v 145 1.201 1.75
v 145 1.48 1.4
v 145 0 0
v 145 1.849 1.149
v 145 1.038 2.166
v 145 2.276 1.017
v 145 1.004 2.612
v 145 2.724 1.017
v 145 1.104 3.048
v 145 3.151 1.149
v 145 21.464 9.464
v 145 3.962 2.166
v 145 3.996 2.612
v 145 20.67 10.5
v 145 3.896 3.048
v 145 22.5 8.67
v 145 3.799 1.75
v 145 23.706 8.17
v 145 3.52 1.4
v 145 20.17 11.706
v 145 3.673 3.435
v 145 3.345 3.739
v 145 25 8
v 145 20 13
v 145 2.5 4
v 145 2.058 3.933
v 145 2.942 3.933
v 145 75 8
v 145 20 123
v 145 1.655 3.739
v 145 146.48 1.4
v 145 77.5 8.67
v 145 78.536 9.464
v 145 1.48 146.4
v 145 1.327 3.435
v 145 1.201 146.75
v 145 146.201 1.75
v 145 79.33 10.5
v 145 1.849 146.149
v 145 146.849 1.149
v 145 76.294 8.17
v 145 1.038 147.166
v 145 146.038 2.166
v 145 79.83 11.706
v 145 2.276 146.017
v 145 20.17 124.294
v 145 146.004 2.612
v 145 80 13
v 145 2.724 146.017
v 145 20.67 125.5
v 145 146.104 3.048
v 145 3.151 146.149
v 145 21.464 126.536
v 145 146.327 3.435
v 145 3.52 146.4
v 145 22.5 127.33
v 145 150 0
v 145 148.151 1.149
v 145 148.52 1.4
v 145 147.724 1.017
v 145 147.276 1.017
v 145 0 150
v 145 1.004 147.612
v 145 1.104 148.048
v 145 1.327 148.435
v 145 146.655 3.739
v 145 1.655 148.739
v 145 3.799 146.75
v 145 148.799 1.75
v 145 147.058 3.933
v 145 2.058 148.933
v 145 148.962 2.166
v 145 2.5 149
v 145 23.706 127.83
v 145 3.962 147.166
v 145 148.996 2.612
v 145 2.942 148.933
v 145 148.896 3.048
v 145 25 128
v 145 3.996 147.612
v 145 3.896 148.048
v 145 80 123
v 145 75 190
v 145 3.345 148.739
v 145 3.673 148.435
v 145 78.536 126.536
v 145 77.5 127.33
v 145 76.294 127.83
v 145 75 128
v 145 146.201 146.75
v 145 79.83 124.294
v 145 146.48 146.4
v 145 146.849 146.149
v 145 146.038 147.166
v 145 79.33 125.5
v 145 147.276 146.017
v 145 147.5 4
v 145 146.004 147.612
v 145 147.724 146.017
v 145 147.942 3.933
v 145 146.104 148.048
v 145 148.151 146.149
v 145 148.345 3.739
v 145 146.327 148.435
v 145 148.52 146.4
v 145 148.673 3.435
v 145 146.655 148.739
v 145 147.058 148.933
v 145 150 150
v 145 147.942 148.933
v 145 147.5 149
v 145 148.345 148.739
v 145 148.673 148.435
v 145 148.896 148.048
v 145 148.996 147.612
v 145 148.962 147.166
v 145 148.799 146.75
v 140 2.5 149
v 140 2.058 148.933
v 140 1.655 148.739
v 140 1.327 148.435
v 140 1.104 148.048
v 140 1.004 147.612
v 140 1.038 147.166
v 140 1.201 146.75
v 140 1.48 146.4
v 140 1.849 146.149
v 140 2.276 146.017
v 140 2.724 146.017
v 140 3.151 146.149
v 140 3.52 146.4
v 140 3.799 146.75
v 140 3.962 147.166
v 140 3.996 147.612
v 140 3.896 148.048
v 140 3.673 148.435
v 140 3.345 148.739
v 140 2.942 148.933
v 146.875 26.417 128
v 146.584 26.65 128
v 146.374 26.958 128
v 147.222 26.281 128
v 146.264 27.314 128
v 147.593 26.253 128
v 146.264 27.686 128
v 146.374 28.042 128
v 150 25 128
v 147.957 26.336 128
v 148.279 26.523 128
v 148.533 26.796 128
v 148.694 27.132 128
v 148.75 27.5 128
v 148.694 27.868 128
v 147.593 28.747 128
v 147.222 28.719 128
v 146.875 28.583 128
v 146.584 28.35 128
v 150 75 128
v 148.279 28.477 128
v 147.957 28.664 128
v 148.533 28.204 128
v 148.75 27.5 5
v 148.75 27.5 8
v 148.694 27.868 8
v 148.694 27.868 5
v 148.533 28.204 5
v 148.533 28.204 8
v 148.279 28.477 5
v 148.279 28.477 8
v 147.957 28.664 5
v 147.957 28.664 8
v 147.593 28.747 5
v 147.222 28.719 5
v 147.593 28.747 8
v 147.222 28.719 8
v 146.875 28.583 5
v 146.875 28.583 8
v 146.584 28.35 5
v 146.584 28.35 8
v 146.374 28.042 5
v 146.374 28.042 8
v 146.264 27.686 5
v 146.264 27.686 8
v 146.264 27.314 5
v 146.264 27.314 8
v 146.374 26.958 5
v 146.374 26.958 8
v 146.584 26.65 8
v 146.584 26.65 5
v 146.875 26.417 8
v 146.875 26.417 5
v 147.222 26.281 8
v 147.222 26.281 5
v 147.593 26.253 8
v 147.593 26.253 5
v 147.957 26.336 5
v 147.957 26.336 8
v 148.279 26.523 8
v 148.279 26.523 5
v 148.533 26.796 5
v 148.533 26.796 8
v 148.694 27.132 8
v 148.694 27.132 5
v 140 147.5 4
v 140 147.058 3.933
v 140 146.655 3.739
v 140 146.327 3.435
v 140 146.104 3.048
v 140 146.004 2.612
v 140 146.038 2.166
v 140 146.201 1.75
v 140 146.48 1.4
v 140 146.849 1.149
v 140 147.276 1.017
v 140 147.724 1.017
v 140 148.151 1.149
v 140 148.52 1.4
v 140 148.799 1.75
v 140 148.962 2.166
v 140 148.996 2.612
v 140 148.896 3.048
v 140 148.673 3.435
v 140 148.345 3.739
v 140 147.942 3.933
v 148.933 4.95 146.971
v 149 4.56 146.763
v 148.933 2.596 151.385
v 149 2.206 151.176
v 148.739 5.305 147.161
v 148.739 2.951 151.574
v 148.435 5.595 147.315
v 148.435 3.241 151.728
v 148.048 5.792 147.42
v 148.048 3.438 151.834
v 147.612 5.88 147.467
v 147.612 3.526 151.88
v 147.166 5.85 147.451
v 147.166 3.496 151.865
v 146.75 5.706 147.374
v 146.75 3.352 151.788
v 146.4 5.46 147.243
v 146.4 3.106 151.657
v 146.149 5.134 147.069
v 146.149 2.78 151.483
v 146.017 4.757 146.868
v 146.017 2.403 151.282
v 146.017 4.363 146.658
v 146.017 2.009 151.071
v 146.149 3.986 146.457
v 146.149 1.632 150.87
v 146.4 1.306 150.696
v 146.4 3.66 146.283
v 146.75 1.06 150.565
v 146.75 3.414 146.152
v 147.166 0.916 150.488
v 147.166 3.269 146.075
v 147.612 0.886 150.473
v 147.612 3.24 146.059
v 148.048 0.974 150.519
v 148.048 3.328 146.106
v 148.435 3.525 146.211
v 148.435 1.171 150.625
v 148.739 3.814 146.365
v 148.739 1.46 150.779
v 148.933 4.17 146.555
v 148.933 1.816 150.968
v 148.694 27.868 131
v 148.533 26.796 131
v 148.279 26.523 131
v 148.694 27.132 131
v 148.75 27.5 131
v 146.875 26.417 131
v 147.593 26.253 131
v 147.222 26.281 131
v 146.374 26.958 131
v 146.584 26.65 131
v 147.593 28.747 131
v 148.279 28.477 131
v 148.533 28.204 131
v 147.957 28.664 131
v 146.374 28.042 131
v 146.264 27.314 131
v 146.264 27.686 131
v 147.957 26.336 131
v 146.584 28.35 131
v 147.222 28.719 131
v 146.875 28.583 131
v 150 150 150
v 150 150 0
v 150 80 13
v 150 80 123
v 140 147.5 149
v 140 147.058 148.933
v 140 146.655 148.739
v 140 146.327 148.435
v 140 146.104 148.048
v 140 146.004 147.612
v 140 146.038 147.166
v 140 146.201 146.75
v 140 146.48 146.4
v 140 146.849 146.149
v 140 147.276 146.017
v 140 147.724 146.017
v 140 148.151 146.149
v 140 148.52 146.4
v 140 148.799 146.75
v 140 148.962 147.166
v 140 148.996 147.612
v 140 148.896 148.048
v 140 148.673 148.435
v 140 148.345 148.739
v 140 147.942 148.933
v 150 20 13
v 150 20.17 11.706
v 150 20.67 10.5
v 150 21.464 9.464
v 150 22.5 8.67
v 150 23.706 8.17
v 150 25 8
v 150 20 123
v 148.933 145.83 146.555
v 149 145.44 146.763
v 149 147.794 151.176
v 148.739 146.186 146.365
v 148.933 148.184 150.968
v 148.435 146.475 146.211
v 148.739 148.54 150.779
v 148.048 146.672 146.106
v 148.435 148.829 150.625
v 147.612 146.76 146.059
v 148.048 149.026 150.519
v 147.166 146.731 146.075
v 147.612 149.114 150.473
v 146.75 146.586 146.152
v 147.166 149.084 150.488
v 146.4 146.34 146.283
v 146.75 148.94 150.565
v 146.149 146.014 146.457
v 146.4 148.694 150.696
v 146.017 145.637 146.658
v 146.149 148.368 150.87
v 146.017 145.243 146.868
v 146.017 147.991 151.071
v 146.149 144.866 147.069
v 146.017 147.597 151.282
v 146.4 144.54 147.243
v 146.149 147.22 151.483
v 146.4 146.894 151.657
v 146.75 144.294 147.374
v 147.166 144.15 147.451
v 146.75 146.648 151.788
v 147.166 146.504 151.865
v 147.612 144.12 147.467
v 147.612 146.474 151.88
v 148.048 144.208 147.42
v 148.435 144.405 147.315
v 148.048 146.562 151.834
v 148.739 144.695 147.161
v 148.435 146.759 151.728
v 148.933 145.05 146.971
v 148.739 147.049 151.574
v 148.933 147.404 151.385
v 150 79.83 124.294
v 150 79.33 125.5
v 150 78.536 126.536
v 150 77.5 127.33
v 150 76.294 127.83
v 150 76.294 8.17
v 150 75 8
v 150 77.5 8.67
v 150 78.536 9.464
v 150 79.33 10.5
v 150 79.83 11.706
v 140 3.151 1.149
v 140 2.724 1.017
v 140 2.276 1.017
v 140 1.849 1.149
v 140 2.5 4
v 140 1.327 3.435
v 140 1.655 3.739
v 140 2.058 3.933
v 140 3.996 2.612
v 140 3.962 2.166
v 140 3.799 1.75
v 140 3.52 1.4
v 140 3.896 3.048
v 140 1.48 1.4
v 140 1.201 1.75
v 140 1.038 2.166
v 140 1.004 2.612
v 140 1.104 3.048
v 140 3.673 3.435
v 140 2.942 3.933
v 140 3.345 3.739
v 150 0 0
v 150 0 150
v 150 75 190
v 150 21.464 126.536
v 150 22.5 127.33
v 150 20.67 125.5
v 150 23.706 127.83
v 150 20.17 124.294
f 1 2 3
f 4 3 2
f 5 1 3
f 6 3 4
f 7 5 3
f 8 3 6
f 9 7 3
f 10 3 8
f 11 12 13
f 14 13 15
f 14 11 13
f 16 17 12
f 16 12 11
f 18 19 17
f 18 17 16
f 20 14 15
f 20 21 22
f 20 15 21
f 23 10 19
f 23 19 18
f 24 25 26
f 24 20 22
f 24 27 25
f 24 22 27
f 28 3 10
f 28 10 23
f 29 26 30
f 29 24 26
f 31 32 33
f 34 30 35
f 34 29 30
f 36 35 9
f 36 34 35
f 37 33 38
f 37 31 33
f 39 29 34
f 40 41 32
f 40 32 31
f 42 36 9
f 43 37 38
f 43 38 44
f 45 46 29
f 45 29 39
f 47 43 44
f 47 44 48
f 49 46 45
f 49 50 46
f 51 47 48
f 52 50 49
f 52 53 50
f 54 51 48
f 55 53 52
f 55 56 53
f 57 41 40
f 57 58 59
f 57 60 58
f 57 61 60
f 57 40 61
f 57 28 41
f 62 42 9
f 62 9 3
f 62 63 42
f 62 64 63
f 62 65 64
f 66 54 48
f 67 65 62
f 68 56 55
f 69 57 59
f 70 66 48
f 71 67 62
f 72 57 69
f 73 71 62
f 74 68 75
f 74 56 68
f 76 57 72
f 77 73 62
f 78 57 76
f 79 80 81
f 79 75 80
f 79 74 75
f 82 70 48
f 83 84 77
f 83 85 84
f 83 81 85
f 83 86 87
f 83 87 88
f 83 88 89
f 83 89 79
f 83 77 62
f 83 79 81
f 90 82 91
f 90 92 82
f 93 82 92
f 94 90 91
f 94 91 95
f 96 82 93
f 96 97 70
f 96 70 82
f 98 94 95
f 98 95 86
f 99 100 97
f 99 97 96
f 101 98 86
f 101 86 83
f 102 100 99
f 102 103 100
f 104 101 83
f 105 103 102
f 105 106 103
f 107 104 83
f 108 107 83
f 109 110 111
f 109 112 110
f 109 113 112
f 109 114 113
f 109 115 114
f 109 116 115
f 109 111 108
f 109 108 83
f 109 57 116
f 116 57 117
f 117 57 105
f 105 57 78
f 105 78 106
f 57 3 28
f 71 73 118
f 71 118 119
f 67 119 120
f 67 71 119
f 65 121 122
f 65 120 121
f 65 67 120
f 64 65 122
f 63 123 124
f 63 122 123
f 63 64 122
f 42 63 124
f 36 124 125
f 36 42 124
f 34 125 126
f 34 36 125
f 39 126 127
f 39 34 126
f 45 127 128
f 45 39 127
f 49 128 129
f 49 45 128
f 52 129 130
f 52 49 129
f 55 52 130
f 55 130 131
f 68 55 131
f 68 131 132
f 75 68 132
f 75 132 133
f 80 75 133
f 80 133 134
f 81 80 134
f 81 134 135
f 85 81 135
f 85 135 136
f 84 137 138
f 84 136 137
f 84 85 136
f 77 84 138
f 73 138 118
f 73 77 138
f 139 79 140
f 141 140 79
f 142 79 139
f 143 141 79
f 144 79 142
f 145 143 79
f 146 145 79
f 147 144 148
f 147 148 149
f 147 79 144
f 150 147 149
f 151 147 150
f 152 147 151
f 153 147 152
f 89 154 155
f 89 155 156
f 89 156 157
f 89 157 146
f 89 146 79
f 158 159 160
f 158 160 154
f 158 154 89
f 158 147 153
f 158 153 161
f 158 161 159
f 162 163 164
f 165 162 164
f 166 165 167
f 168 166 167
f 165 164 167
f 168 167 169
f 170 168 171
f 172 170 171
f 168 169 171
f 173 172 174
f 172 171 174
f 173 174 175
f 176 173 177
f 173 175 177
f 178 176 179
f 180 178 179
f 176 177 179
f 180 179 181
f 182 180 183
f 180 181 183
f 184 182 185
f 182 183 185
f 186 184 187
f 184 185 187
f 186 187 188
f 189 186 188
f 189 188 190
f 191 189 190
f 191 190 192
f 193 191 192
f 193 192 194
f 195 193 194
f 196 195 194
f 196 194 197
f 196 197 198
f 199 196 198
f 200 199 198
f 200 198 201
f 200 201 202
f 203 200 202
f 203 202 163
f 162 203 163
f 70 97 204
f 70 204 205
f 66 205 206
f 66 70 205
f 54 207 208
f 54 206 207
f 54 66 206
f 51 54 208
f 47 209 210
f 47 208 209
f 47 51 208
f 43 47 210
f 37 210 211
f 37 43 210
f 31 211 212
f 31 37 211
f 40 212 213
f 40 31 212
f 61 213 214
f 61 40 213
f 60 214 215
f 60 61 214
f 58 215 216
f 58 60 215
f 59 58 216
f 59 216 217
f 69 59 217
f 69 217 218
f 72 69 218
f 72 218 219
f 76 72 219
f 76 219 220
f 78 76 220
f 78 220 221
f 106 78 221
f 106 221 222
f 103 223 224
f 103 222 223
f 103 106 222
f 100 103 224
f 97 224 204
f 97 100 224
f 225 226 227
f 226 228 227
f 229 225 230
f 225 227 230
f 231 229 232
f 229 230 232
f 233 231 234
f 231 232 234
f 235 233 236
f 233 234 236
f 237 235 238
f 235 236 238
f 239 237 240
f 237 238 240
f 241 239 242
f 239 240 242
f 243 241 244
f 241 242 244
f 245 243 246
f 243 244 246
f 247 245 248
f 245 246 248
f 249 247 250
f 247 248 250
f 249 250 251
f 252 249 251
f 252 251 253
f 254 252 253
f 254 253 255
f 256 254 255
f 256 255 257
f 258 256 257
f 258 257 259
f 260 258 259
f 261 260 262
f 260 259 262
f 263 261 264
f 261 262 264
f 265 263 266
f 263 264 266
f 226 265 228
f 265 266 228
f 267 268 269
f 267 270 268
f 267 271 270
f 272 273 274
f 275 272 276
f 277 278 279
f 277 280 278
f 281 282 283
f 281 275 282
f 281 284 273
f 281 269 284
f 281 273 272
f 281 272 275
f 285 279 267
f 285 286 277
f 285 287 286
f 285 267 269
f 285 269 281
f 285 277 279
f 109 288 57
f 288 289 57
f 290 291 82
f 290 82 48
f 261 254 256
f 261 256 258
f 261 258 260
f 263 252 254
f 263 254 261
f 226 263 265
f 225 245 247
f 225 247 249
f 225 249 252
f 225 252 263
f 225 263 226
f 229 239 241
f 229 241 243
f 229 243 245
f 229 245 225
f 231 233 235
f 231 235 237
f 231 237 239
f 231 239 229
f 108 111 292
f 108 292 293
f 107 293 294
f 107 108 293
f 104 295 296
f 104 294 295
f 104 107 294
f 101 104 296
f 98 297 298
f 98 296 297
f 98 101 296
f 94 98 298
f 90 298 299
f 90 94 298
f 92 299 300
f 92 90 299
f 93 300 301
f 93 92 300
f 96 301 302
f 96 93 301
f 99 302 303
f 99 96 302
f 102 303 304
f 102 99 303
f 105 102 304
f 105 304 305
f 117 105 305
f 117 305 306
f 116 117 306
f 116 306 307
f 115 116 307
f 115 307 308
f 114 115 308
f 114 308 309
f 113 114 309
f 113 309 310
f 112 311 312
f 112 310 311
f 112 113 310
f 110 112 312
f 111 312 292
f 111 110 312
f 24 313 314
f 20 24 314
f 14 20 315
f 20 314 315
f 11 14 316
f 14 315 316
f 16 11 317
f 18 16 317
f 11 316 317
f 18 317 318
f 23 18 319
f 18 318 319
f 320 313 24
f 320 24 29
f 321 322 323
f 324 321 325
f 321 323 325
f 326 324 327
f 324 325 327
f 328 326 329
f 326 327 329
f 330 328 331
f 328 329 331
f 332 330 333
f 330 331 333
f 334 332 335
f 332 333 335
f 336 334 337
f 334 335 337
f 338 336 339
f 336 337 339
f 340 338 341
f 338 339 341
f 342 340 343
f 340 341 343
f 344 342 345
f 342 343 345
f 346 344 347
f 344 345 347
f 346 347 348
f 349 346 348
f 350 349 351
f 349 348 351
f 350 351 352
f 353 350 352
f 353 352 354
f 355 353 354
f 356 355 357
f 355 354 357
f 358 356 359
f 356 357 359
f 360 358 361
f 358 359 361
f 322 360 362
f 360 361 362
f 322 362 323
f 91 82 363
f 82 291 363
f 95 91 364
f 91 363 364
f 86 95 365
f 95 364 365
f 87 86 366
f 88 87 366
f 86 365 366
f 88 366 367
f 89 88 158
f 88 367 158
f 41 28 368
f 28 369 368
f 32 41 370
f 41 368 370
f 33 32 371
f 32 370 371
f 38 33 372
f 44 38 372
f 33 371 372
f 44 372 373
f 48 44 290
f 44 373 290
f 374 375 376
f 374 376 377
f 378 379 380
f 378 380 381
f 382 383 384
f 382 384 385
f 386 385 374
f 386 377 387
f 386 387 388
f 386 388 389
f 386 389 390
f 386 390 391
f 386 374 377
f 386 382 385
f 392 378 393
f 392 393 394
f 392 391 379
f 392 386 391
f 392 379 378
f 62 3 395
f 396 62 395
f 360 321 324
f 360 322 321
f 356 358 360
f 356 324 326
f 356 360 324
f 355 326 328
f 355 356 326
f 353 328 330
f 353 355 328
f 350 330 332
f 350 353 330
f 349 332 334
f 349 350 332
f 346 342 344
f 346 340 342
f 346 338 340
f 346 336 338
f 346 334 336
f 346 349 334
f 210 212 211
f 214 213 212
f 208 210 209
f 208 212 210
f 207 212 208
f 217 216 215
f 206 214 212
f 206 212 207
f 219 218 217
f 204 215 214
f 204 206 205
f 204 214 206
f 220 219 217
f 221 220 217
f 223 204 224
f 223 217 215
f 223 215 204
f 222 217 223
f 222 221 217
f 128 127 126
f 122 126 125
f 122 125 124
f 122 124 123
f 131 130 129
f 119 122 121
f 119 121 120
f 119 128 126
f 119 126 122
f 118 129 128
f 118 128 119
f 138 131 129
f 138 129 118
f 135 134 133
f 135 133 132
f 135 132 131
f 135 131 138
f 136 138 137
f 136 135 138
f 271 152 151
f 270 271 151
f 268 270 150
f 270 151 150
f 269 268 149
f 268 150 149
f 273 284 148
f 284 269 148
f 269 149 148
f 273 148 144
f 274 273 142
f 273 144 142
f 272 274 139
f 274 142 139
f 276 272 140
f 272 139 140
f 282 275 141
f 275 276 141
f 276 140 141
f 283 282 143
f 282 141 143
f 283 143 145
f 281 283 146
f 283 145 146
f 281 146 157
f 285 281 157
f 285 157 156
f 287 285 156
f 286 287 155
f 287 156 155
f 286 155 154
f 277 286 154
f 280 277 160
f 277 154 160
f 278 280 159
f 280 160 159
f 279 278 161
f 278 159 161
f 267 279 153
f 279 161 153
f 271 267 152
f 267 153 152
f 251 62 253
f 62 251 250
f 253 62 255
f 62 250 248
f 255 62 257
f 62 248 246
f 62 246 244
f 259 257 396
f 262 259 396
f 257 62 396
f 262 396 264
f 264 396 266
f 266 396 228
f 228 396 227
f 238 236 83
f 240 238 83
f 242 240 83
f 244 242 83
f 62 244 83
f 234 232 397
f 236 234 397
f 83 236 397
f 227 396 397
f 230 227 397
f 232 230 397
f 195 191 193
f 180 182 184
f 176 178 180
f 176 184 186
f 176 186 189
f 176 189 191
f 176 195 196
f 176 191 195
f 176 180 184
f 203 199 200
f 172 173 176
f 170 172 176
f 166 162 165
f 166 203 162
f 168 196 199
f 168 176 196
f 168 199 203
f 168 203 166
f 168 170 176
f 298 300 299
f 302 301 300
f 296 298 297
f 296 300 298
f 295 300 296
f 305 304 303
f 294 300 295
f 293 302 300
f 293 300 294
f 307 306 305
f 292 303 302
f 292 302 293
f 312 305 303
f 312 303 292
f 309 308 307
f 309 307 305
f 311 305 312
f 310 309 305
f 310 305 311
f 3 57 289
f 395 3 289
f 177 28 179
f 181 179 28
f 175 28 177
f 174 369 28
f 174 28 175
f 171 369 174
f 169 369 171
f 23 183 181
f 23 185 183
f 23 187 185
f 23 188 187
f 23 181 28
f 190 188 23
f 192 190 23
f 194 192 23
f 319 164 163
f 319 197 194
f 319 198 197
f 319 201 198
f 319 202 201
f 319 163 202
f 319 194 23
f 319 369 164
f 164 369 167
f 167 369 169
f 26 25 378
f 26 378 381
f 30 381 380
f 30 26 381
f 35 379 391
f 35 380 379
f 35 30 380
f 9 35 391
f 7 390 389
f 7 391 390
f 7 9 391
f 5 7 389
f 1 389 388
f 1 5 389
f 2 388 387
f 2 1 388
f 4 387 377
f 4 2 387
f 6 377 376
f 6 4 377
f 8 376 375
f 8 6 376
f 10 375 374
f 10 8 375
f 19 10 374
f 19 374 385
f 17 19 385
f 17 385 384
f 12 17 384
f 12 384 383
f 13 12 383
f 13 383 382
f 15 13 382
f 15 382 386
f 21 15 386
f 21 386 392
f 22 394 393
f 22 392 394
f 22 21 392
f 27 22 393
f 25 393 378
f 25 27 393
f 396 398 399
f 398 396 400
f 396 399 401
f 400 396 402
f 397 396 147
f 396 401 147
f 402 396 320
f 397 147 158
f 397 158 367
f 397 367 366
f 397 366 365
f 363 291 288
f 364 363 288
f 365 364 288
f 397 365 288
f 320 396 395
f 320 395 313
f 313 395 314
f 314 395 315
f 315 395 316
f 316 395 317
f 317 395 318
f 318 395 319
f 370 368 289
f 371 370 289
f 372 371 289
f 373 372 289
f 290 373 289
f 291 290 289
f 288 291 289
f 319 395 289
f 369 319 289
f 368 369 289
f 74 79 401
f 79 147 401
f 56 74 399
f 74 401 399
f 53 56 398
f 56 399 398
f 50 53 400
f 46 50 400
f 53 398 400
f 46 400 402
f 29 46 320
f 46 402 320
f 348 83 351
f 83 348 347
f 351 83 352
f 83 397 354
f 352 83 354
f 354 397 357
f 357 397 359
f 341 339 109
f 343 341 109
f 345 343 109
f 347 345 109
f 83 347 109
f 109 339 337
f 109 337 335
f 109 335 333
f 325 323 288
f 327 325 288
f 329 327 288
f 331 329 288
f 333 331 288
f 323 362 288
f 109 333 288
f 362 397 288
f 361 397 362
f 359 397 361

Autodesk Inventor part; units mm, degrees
sketch "Boceto1" plane through (0, 0, 0) normal (0, 0, 1) x (1, 0, 0)
  line L0 (0, 0) -> (150, 0)
  line L1 (150, 0) -> (150, 150)
  line L2 (150, 150) -> (0, 150)
  line L3 (0, 150) -> (0, 0)
  line L4 (5, 145) -> (145, 145)
  line L5 (145, 145) -> (145, 5)
  line L6 (145, 5) -> (5, 5)
  line L7 (5, 5) -> (5, 145)
  dimension "d0" = 150
  dimension "d1" = 150
  dimension "d2" = 5
extrude "Extrusión1" add sketch "Boceto1" along normal blind 150
sketch "Boceto2" plane through (150, 0, 0) normal (1, 0, 0) x (0, 0, -1)
  line L0 (-150, 0) -> (-150, 150) projected
  line L1 (-150, 75) -> (-190, 75) construction
  line L2 (-190, 75) -> (-150, 150)
  line L3 (0, 0) -> (-150, 0) construction
  line L4 (-150, 0) -> (-190, 75)
  dimension "d5" = 40
extrude "Extrusión2" add sketch "Boceto2" against normal blind 5
ref_plane "Plano de trabajo1" through (75, 0, 0) normal (1, 0, 0) x (0, 0, -1)
mirror "Simetría1" about plane through (75, 0, 0) normal (1, 0, 0) of "Extrusión2"
sketch "Boceto3" plane through (0, 150, 0) normal (0, 1, 0) x (1, 0, 0)
  line L0 (105, -60) -> (45, -60)
  line L1 (45, -60) -> (45, -95)
  line L2 (60, -110) -> (90, -110)
  line L3 (105, -95) -> (105, -60)
  line L4 (150, 0) -> (0, 0) projected
  line L5 (145, -150) -> (5, -150) projected
  arc A0 (90, -110) -> (105, -95) centre (90, -95) ccw
  arc A1 (45, -95) -> (60, -110) centre (60, -95) ccw
  point P0 (45, -110)
  point P1 (105, -110)
  point P2 (75, -60)
  point P3 (75, 0)
  dimension "d8" = 60
  dimension "d9" = 50
  dimension "d10" = 40
  dimension "d11" = 15
extrude "Extrusión3" cut sketch "Boceto3" against normal through all
sketch "Boceto4" plane through (150, 0, 0) normal (1, 0, 0) x (0, 0, -1)
  line L0 (-13, 20) -> (-123, 20)
  line L1 (-128, 25) -> (-128, 75)
  line L2 (-123, 80) -> (-13, 80)
  line L3 (-8, 75) -> (-8, 25)
  line L4 (0, 0) -> (0, 150) projected
  line L5 (0, 0) -> (-150, 0) projected
  arc A0 (-123, 80) -> (-128, 75) centre (-123, 75) ccw
  arc A1 (-8, 75) -> (-13, 80) centre (-13, 75) ccw
  arc A2 (-13, 20) -> (-8, 25) centre (-13, 25) ccw
  arc A3 (-128, 25) -> (-123, 20) centre (-123, 25) ccw
  point P0 (-128, 80)
  point P1 (-128, 20)
  point P2 (-8, 80)
  dimension "d14" = 120
  dimension "d15" = 60
  dimension "d16" = 8
  dimension "d17" = 20
  dimension "d18" = 5
extrude "Extrusión4" cut sketch "Boceto4" against normal up to surface (5 mm away)
sketch "Boceto5" plane through (0, 0, 0) normal (-1, 0, 0) x (0, 0, 1)
  line L0 (65, 125) -> (115, 125)
  line L1 (120, 120) -> (120, 30)
  line L2 (115, 25) -> (65, 25)
  line L3 (60, 30) -> (60, 120)
  line L4 (0, 150) -> (0, 0) projected
  arc A0 (120, 120) -> (115, 125) centre (115, 120) ccw
  arc A1 (115, 25) -> (120, 30) centre (115, 30) ccw
  arc A2 (65, 125) -> (60, 120) centre (65, 120) ccw
  arc A3 (60, 30) -> (65, 25) centre (65, 30) ccw
  point P0 (60, 150)
  point P1 (120, 25)
  point P2 (120, 125)
  point P3 (60, 25)
  point P4 (60, 75)
  point P5 (0, 75)
  dimension "d21" = 60
  dimension "d22" = 100
  dimension "d23" = 60
  dimension "d24" = 5
extrude "Extrusión5" cut sketch "Boceto5" against normal blind 10
sketch "Boceto6" plane through (150, 0, 0) normal (1, 0, 0) x (0, 0, -1)
  line L0 (-190, 75) -> (-150, 0) projected
  line L1 (-150, 150) -> (-190, 75) projected
  line L2 (-154.4118, 152.3529) -> (-195.6667, 75)
  line L3 (-195.6667, 75) -> (-154.4118, -2.3529)
  line L4 (-154.4118, 152.3529) -> (-144.4118, 152.3529)
  line L5 (-144.4118, 152.3529) -> (-144.4118, 150)
  line L6 (-154.4118, -2.3529) -> (-144.4118, -2.3529)
  line L7 (-144.4118, -2.3529) -> (-144.4118, 0)
  line L8 (0, 0) -> (-150, 0) projected
  line L9 (0, 150) -> (-150, 150) projected
  dimension "d27" = 5
  dimension "d28" = 10
extrude "Extrusión6" add sketch "Boceto6" along normal blind 10 and the other way blind 160
fillet "Empalme1" radius 5 3 edges at (75, 152.3529, 154.4118) (75, 75, 195.6667) (75, -2.3529, 154.4118)
sketch "Boceto7" plane through (150, 25, 8) normal (0, 0, 1) x (1, 0, 0)
  circle A0 centre (-2.5, 2.5) radius 1.25
  line L0 (0, 50) -> (0, 0) projected
  line L1 (0, 0) -> (-5, 0) projected
  point P0 (-150, -25)
  point P1 (-2.5, 0)
  dimension "d34" = 2.5
  dimension "d35" = 2.5
  dimension "d36" = 2.5
extrude "Extrusión7" cut sketch "Boceto7" against normal blind 3
ref_plane "Plano de trabajo2" through (150, 25, 68) normal (0, 0, 1) x (1, 0, 0)
mirror "Simetría2" about plane through (150, 25, 68) normal (0, 0, 1) of "Extrusión7"
sketch "Boceto8" plane through (160, 0, 0) normal (1, 0, 0) x (0, 0, -1)
  arc A0 (-155.8235, 0.2941) -> (-151.4118, -2.3529) centre (-151.4118, 2.6471) ccw projected
  line L0 (-151.4118, -2.3529) -> (-144.4118, -2.3529) projected
  line L1 (-144.4118, -2.3529) -> (-144.4118, 0) projected
  line L2 (-144.4118, 0) -> (-150, 0) projected
  line L3 (-150, 0) -> (-190, 75) projected
  line L4 (-190, 75) -> (-150, 150) projected
  line L5 (-150, 150) -> (-144.4118, 150) projected
  line L6 (-144.4118, 150) -> (-144.4118, 152.3529) projected
  line L7 (-144.4118, 152.3529) -> (-151.4118, 152.3529) projected
  arc A1 (-151.4118, 152.3529) -> (-155.8235, 149.7059) centre (-151.4118, 147.3529) ccw projected
  line L8 (-155.8235, 149.7059) -> (-194.4118, 77.3529) projected
  arc A2 (-194.4118, 77.3529) -> (-194.4118, 72.6471) centre (-190, 75) ccw projected
  line L9 (-194.4118, 72.6471) -> (-155.8235, 0.2941) projected
  point P0 (0, 0)
extrude "Extrusión8" cut sketch "Boceto8" against normal through all
sketch "Boceto9" plane through (145, 0, 150) normal (0, -0.4705882, 0.8823529) x (1, 0, 0)
  circle A0 centre (2.5, 2.5) radius 1.5
  line L0 (5, 85) -> (5, 0) projected
  line L1 (5, 0) -> (0, 0) projected
  point P0 (-145, -70.5882)
  dimension "d41" = 3
  dimension "d42" = 2.5
  dimension "d43" = 2.5
extrude "Extrusión9" cut sketch "Boceto9" against normal blind 5
ref_plane "Plano de trabajo3" through (75, 0, 0) normal (1, 0, 0) x (0, 0, -1)
ref_plane "Plano de trabajo4" through (0, 75, 0) normal (0, -1, 0) x (1, 0, 0)
mirror "Simetría3" about plane through (75, 0, 0) normal (1, 0, 0) of "Extrusión9"
mirror "Simetría4" about plane through (0, 75, 0) normal (0, -1, 0) of "Extrusión8", "Extrusión9", "Simetría3"
sketch "Boceto10" plane through (0, 0, 0) normal (-1, 0, 0) x (0, 0, 1)
  line L0 (190, 75) -> (150, 0) projected
  line L1 (0, 0) -> (150, 0) projected
  arc A0 (115, 25) -> (120, 30) centre (115, 30) ccw projected
  line L2 (115, 25) -> (65, 25) projected
  arc A1 (60, 30) -> (65, 25) centre (65, 30) ccw projected
  line L3 (60, 30) -> (60, 120) projected
  arc A2 (65, 125) -> (60, 120) centre (65, 120) ccw projected
  line L4 (65, 125) -> (115, 125) projected
  arc A3 (120, 120) -> (115, 125) centre (115, 120) ccw projected
  line L5 (120, 120) -> (120, 30) projected
  line L6 (0, 150) -> (0, 0) projected
  line L7 (0, 0) -> (150, 0) projected
  line L8 (190, 75) -> (150, 0) projected
  line L9 (150, 150) -> (190, 75) projected
  line L10 (0, 150) -> (150, 150) projected
  line L11 (0, 150) -> (150, 150) projected
  line L12 (150, 150) -> (190, 75) projected
extrude "Extrusión10" cut sketch "Boceto10" against normal up to surface (145 mm away) contours L0 L1 L6 L10 L9 | L2 A1 L3 A2 L4 A3 L5 A0
sketch "Boceto11" plane through (145, 0, 0) normal (-1, 0, 0) x (0, 0, 1)
  circle A0 centre (147.5, 2.5) radius 1.5
  line L0 (0, 0) -> (150, 0) projected
  line L1 (75, 0) -> (75, 157.0348) construction
  line L2 (0, 0) -> (0, 150) projected
  line L3 (0, 75) -> (163.5467, 75) construction
  circle A1 centre (147.5, 147.5) radius 1.5
  circle A2 centre (2.5, 2.5) radius 1.5
  circle A3 centre (2.5, 147.5) radius 1.5
  dimension "d48" = 2.5
  dimension "d49" = 3
  dimension "d50" = 2.5
extrude "Extrusión11" add sketch "Boceto11" along normal blind 5
properties part number "CasaJugueteAPM" material "Plástico ABS"
